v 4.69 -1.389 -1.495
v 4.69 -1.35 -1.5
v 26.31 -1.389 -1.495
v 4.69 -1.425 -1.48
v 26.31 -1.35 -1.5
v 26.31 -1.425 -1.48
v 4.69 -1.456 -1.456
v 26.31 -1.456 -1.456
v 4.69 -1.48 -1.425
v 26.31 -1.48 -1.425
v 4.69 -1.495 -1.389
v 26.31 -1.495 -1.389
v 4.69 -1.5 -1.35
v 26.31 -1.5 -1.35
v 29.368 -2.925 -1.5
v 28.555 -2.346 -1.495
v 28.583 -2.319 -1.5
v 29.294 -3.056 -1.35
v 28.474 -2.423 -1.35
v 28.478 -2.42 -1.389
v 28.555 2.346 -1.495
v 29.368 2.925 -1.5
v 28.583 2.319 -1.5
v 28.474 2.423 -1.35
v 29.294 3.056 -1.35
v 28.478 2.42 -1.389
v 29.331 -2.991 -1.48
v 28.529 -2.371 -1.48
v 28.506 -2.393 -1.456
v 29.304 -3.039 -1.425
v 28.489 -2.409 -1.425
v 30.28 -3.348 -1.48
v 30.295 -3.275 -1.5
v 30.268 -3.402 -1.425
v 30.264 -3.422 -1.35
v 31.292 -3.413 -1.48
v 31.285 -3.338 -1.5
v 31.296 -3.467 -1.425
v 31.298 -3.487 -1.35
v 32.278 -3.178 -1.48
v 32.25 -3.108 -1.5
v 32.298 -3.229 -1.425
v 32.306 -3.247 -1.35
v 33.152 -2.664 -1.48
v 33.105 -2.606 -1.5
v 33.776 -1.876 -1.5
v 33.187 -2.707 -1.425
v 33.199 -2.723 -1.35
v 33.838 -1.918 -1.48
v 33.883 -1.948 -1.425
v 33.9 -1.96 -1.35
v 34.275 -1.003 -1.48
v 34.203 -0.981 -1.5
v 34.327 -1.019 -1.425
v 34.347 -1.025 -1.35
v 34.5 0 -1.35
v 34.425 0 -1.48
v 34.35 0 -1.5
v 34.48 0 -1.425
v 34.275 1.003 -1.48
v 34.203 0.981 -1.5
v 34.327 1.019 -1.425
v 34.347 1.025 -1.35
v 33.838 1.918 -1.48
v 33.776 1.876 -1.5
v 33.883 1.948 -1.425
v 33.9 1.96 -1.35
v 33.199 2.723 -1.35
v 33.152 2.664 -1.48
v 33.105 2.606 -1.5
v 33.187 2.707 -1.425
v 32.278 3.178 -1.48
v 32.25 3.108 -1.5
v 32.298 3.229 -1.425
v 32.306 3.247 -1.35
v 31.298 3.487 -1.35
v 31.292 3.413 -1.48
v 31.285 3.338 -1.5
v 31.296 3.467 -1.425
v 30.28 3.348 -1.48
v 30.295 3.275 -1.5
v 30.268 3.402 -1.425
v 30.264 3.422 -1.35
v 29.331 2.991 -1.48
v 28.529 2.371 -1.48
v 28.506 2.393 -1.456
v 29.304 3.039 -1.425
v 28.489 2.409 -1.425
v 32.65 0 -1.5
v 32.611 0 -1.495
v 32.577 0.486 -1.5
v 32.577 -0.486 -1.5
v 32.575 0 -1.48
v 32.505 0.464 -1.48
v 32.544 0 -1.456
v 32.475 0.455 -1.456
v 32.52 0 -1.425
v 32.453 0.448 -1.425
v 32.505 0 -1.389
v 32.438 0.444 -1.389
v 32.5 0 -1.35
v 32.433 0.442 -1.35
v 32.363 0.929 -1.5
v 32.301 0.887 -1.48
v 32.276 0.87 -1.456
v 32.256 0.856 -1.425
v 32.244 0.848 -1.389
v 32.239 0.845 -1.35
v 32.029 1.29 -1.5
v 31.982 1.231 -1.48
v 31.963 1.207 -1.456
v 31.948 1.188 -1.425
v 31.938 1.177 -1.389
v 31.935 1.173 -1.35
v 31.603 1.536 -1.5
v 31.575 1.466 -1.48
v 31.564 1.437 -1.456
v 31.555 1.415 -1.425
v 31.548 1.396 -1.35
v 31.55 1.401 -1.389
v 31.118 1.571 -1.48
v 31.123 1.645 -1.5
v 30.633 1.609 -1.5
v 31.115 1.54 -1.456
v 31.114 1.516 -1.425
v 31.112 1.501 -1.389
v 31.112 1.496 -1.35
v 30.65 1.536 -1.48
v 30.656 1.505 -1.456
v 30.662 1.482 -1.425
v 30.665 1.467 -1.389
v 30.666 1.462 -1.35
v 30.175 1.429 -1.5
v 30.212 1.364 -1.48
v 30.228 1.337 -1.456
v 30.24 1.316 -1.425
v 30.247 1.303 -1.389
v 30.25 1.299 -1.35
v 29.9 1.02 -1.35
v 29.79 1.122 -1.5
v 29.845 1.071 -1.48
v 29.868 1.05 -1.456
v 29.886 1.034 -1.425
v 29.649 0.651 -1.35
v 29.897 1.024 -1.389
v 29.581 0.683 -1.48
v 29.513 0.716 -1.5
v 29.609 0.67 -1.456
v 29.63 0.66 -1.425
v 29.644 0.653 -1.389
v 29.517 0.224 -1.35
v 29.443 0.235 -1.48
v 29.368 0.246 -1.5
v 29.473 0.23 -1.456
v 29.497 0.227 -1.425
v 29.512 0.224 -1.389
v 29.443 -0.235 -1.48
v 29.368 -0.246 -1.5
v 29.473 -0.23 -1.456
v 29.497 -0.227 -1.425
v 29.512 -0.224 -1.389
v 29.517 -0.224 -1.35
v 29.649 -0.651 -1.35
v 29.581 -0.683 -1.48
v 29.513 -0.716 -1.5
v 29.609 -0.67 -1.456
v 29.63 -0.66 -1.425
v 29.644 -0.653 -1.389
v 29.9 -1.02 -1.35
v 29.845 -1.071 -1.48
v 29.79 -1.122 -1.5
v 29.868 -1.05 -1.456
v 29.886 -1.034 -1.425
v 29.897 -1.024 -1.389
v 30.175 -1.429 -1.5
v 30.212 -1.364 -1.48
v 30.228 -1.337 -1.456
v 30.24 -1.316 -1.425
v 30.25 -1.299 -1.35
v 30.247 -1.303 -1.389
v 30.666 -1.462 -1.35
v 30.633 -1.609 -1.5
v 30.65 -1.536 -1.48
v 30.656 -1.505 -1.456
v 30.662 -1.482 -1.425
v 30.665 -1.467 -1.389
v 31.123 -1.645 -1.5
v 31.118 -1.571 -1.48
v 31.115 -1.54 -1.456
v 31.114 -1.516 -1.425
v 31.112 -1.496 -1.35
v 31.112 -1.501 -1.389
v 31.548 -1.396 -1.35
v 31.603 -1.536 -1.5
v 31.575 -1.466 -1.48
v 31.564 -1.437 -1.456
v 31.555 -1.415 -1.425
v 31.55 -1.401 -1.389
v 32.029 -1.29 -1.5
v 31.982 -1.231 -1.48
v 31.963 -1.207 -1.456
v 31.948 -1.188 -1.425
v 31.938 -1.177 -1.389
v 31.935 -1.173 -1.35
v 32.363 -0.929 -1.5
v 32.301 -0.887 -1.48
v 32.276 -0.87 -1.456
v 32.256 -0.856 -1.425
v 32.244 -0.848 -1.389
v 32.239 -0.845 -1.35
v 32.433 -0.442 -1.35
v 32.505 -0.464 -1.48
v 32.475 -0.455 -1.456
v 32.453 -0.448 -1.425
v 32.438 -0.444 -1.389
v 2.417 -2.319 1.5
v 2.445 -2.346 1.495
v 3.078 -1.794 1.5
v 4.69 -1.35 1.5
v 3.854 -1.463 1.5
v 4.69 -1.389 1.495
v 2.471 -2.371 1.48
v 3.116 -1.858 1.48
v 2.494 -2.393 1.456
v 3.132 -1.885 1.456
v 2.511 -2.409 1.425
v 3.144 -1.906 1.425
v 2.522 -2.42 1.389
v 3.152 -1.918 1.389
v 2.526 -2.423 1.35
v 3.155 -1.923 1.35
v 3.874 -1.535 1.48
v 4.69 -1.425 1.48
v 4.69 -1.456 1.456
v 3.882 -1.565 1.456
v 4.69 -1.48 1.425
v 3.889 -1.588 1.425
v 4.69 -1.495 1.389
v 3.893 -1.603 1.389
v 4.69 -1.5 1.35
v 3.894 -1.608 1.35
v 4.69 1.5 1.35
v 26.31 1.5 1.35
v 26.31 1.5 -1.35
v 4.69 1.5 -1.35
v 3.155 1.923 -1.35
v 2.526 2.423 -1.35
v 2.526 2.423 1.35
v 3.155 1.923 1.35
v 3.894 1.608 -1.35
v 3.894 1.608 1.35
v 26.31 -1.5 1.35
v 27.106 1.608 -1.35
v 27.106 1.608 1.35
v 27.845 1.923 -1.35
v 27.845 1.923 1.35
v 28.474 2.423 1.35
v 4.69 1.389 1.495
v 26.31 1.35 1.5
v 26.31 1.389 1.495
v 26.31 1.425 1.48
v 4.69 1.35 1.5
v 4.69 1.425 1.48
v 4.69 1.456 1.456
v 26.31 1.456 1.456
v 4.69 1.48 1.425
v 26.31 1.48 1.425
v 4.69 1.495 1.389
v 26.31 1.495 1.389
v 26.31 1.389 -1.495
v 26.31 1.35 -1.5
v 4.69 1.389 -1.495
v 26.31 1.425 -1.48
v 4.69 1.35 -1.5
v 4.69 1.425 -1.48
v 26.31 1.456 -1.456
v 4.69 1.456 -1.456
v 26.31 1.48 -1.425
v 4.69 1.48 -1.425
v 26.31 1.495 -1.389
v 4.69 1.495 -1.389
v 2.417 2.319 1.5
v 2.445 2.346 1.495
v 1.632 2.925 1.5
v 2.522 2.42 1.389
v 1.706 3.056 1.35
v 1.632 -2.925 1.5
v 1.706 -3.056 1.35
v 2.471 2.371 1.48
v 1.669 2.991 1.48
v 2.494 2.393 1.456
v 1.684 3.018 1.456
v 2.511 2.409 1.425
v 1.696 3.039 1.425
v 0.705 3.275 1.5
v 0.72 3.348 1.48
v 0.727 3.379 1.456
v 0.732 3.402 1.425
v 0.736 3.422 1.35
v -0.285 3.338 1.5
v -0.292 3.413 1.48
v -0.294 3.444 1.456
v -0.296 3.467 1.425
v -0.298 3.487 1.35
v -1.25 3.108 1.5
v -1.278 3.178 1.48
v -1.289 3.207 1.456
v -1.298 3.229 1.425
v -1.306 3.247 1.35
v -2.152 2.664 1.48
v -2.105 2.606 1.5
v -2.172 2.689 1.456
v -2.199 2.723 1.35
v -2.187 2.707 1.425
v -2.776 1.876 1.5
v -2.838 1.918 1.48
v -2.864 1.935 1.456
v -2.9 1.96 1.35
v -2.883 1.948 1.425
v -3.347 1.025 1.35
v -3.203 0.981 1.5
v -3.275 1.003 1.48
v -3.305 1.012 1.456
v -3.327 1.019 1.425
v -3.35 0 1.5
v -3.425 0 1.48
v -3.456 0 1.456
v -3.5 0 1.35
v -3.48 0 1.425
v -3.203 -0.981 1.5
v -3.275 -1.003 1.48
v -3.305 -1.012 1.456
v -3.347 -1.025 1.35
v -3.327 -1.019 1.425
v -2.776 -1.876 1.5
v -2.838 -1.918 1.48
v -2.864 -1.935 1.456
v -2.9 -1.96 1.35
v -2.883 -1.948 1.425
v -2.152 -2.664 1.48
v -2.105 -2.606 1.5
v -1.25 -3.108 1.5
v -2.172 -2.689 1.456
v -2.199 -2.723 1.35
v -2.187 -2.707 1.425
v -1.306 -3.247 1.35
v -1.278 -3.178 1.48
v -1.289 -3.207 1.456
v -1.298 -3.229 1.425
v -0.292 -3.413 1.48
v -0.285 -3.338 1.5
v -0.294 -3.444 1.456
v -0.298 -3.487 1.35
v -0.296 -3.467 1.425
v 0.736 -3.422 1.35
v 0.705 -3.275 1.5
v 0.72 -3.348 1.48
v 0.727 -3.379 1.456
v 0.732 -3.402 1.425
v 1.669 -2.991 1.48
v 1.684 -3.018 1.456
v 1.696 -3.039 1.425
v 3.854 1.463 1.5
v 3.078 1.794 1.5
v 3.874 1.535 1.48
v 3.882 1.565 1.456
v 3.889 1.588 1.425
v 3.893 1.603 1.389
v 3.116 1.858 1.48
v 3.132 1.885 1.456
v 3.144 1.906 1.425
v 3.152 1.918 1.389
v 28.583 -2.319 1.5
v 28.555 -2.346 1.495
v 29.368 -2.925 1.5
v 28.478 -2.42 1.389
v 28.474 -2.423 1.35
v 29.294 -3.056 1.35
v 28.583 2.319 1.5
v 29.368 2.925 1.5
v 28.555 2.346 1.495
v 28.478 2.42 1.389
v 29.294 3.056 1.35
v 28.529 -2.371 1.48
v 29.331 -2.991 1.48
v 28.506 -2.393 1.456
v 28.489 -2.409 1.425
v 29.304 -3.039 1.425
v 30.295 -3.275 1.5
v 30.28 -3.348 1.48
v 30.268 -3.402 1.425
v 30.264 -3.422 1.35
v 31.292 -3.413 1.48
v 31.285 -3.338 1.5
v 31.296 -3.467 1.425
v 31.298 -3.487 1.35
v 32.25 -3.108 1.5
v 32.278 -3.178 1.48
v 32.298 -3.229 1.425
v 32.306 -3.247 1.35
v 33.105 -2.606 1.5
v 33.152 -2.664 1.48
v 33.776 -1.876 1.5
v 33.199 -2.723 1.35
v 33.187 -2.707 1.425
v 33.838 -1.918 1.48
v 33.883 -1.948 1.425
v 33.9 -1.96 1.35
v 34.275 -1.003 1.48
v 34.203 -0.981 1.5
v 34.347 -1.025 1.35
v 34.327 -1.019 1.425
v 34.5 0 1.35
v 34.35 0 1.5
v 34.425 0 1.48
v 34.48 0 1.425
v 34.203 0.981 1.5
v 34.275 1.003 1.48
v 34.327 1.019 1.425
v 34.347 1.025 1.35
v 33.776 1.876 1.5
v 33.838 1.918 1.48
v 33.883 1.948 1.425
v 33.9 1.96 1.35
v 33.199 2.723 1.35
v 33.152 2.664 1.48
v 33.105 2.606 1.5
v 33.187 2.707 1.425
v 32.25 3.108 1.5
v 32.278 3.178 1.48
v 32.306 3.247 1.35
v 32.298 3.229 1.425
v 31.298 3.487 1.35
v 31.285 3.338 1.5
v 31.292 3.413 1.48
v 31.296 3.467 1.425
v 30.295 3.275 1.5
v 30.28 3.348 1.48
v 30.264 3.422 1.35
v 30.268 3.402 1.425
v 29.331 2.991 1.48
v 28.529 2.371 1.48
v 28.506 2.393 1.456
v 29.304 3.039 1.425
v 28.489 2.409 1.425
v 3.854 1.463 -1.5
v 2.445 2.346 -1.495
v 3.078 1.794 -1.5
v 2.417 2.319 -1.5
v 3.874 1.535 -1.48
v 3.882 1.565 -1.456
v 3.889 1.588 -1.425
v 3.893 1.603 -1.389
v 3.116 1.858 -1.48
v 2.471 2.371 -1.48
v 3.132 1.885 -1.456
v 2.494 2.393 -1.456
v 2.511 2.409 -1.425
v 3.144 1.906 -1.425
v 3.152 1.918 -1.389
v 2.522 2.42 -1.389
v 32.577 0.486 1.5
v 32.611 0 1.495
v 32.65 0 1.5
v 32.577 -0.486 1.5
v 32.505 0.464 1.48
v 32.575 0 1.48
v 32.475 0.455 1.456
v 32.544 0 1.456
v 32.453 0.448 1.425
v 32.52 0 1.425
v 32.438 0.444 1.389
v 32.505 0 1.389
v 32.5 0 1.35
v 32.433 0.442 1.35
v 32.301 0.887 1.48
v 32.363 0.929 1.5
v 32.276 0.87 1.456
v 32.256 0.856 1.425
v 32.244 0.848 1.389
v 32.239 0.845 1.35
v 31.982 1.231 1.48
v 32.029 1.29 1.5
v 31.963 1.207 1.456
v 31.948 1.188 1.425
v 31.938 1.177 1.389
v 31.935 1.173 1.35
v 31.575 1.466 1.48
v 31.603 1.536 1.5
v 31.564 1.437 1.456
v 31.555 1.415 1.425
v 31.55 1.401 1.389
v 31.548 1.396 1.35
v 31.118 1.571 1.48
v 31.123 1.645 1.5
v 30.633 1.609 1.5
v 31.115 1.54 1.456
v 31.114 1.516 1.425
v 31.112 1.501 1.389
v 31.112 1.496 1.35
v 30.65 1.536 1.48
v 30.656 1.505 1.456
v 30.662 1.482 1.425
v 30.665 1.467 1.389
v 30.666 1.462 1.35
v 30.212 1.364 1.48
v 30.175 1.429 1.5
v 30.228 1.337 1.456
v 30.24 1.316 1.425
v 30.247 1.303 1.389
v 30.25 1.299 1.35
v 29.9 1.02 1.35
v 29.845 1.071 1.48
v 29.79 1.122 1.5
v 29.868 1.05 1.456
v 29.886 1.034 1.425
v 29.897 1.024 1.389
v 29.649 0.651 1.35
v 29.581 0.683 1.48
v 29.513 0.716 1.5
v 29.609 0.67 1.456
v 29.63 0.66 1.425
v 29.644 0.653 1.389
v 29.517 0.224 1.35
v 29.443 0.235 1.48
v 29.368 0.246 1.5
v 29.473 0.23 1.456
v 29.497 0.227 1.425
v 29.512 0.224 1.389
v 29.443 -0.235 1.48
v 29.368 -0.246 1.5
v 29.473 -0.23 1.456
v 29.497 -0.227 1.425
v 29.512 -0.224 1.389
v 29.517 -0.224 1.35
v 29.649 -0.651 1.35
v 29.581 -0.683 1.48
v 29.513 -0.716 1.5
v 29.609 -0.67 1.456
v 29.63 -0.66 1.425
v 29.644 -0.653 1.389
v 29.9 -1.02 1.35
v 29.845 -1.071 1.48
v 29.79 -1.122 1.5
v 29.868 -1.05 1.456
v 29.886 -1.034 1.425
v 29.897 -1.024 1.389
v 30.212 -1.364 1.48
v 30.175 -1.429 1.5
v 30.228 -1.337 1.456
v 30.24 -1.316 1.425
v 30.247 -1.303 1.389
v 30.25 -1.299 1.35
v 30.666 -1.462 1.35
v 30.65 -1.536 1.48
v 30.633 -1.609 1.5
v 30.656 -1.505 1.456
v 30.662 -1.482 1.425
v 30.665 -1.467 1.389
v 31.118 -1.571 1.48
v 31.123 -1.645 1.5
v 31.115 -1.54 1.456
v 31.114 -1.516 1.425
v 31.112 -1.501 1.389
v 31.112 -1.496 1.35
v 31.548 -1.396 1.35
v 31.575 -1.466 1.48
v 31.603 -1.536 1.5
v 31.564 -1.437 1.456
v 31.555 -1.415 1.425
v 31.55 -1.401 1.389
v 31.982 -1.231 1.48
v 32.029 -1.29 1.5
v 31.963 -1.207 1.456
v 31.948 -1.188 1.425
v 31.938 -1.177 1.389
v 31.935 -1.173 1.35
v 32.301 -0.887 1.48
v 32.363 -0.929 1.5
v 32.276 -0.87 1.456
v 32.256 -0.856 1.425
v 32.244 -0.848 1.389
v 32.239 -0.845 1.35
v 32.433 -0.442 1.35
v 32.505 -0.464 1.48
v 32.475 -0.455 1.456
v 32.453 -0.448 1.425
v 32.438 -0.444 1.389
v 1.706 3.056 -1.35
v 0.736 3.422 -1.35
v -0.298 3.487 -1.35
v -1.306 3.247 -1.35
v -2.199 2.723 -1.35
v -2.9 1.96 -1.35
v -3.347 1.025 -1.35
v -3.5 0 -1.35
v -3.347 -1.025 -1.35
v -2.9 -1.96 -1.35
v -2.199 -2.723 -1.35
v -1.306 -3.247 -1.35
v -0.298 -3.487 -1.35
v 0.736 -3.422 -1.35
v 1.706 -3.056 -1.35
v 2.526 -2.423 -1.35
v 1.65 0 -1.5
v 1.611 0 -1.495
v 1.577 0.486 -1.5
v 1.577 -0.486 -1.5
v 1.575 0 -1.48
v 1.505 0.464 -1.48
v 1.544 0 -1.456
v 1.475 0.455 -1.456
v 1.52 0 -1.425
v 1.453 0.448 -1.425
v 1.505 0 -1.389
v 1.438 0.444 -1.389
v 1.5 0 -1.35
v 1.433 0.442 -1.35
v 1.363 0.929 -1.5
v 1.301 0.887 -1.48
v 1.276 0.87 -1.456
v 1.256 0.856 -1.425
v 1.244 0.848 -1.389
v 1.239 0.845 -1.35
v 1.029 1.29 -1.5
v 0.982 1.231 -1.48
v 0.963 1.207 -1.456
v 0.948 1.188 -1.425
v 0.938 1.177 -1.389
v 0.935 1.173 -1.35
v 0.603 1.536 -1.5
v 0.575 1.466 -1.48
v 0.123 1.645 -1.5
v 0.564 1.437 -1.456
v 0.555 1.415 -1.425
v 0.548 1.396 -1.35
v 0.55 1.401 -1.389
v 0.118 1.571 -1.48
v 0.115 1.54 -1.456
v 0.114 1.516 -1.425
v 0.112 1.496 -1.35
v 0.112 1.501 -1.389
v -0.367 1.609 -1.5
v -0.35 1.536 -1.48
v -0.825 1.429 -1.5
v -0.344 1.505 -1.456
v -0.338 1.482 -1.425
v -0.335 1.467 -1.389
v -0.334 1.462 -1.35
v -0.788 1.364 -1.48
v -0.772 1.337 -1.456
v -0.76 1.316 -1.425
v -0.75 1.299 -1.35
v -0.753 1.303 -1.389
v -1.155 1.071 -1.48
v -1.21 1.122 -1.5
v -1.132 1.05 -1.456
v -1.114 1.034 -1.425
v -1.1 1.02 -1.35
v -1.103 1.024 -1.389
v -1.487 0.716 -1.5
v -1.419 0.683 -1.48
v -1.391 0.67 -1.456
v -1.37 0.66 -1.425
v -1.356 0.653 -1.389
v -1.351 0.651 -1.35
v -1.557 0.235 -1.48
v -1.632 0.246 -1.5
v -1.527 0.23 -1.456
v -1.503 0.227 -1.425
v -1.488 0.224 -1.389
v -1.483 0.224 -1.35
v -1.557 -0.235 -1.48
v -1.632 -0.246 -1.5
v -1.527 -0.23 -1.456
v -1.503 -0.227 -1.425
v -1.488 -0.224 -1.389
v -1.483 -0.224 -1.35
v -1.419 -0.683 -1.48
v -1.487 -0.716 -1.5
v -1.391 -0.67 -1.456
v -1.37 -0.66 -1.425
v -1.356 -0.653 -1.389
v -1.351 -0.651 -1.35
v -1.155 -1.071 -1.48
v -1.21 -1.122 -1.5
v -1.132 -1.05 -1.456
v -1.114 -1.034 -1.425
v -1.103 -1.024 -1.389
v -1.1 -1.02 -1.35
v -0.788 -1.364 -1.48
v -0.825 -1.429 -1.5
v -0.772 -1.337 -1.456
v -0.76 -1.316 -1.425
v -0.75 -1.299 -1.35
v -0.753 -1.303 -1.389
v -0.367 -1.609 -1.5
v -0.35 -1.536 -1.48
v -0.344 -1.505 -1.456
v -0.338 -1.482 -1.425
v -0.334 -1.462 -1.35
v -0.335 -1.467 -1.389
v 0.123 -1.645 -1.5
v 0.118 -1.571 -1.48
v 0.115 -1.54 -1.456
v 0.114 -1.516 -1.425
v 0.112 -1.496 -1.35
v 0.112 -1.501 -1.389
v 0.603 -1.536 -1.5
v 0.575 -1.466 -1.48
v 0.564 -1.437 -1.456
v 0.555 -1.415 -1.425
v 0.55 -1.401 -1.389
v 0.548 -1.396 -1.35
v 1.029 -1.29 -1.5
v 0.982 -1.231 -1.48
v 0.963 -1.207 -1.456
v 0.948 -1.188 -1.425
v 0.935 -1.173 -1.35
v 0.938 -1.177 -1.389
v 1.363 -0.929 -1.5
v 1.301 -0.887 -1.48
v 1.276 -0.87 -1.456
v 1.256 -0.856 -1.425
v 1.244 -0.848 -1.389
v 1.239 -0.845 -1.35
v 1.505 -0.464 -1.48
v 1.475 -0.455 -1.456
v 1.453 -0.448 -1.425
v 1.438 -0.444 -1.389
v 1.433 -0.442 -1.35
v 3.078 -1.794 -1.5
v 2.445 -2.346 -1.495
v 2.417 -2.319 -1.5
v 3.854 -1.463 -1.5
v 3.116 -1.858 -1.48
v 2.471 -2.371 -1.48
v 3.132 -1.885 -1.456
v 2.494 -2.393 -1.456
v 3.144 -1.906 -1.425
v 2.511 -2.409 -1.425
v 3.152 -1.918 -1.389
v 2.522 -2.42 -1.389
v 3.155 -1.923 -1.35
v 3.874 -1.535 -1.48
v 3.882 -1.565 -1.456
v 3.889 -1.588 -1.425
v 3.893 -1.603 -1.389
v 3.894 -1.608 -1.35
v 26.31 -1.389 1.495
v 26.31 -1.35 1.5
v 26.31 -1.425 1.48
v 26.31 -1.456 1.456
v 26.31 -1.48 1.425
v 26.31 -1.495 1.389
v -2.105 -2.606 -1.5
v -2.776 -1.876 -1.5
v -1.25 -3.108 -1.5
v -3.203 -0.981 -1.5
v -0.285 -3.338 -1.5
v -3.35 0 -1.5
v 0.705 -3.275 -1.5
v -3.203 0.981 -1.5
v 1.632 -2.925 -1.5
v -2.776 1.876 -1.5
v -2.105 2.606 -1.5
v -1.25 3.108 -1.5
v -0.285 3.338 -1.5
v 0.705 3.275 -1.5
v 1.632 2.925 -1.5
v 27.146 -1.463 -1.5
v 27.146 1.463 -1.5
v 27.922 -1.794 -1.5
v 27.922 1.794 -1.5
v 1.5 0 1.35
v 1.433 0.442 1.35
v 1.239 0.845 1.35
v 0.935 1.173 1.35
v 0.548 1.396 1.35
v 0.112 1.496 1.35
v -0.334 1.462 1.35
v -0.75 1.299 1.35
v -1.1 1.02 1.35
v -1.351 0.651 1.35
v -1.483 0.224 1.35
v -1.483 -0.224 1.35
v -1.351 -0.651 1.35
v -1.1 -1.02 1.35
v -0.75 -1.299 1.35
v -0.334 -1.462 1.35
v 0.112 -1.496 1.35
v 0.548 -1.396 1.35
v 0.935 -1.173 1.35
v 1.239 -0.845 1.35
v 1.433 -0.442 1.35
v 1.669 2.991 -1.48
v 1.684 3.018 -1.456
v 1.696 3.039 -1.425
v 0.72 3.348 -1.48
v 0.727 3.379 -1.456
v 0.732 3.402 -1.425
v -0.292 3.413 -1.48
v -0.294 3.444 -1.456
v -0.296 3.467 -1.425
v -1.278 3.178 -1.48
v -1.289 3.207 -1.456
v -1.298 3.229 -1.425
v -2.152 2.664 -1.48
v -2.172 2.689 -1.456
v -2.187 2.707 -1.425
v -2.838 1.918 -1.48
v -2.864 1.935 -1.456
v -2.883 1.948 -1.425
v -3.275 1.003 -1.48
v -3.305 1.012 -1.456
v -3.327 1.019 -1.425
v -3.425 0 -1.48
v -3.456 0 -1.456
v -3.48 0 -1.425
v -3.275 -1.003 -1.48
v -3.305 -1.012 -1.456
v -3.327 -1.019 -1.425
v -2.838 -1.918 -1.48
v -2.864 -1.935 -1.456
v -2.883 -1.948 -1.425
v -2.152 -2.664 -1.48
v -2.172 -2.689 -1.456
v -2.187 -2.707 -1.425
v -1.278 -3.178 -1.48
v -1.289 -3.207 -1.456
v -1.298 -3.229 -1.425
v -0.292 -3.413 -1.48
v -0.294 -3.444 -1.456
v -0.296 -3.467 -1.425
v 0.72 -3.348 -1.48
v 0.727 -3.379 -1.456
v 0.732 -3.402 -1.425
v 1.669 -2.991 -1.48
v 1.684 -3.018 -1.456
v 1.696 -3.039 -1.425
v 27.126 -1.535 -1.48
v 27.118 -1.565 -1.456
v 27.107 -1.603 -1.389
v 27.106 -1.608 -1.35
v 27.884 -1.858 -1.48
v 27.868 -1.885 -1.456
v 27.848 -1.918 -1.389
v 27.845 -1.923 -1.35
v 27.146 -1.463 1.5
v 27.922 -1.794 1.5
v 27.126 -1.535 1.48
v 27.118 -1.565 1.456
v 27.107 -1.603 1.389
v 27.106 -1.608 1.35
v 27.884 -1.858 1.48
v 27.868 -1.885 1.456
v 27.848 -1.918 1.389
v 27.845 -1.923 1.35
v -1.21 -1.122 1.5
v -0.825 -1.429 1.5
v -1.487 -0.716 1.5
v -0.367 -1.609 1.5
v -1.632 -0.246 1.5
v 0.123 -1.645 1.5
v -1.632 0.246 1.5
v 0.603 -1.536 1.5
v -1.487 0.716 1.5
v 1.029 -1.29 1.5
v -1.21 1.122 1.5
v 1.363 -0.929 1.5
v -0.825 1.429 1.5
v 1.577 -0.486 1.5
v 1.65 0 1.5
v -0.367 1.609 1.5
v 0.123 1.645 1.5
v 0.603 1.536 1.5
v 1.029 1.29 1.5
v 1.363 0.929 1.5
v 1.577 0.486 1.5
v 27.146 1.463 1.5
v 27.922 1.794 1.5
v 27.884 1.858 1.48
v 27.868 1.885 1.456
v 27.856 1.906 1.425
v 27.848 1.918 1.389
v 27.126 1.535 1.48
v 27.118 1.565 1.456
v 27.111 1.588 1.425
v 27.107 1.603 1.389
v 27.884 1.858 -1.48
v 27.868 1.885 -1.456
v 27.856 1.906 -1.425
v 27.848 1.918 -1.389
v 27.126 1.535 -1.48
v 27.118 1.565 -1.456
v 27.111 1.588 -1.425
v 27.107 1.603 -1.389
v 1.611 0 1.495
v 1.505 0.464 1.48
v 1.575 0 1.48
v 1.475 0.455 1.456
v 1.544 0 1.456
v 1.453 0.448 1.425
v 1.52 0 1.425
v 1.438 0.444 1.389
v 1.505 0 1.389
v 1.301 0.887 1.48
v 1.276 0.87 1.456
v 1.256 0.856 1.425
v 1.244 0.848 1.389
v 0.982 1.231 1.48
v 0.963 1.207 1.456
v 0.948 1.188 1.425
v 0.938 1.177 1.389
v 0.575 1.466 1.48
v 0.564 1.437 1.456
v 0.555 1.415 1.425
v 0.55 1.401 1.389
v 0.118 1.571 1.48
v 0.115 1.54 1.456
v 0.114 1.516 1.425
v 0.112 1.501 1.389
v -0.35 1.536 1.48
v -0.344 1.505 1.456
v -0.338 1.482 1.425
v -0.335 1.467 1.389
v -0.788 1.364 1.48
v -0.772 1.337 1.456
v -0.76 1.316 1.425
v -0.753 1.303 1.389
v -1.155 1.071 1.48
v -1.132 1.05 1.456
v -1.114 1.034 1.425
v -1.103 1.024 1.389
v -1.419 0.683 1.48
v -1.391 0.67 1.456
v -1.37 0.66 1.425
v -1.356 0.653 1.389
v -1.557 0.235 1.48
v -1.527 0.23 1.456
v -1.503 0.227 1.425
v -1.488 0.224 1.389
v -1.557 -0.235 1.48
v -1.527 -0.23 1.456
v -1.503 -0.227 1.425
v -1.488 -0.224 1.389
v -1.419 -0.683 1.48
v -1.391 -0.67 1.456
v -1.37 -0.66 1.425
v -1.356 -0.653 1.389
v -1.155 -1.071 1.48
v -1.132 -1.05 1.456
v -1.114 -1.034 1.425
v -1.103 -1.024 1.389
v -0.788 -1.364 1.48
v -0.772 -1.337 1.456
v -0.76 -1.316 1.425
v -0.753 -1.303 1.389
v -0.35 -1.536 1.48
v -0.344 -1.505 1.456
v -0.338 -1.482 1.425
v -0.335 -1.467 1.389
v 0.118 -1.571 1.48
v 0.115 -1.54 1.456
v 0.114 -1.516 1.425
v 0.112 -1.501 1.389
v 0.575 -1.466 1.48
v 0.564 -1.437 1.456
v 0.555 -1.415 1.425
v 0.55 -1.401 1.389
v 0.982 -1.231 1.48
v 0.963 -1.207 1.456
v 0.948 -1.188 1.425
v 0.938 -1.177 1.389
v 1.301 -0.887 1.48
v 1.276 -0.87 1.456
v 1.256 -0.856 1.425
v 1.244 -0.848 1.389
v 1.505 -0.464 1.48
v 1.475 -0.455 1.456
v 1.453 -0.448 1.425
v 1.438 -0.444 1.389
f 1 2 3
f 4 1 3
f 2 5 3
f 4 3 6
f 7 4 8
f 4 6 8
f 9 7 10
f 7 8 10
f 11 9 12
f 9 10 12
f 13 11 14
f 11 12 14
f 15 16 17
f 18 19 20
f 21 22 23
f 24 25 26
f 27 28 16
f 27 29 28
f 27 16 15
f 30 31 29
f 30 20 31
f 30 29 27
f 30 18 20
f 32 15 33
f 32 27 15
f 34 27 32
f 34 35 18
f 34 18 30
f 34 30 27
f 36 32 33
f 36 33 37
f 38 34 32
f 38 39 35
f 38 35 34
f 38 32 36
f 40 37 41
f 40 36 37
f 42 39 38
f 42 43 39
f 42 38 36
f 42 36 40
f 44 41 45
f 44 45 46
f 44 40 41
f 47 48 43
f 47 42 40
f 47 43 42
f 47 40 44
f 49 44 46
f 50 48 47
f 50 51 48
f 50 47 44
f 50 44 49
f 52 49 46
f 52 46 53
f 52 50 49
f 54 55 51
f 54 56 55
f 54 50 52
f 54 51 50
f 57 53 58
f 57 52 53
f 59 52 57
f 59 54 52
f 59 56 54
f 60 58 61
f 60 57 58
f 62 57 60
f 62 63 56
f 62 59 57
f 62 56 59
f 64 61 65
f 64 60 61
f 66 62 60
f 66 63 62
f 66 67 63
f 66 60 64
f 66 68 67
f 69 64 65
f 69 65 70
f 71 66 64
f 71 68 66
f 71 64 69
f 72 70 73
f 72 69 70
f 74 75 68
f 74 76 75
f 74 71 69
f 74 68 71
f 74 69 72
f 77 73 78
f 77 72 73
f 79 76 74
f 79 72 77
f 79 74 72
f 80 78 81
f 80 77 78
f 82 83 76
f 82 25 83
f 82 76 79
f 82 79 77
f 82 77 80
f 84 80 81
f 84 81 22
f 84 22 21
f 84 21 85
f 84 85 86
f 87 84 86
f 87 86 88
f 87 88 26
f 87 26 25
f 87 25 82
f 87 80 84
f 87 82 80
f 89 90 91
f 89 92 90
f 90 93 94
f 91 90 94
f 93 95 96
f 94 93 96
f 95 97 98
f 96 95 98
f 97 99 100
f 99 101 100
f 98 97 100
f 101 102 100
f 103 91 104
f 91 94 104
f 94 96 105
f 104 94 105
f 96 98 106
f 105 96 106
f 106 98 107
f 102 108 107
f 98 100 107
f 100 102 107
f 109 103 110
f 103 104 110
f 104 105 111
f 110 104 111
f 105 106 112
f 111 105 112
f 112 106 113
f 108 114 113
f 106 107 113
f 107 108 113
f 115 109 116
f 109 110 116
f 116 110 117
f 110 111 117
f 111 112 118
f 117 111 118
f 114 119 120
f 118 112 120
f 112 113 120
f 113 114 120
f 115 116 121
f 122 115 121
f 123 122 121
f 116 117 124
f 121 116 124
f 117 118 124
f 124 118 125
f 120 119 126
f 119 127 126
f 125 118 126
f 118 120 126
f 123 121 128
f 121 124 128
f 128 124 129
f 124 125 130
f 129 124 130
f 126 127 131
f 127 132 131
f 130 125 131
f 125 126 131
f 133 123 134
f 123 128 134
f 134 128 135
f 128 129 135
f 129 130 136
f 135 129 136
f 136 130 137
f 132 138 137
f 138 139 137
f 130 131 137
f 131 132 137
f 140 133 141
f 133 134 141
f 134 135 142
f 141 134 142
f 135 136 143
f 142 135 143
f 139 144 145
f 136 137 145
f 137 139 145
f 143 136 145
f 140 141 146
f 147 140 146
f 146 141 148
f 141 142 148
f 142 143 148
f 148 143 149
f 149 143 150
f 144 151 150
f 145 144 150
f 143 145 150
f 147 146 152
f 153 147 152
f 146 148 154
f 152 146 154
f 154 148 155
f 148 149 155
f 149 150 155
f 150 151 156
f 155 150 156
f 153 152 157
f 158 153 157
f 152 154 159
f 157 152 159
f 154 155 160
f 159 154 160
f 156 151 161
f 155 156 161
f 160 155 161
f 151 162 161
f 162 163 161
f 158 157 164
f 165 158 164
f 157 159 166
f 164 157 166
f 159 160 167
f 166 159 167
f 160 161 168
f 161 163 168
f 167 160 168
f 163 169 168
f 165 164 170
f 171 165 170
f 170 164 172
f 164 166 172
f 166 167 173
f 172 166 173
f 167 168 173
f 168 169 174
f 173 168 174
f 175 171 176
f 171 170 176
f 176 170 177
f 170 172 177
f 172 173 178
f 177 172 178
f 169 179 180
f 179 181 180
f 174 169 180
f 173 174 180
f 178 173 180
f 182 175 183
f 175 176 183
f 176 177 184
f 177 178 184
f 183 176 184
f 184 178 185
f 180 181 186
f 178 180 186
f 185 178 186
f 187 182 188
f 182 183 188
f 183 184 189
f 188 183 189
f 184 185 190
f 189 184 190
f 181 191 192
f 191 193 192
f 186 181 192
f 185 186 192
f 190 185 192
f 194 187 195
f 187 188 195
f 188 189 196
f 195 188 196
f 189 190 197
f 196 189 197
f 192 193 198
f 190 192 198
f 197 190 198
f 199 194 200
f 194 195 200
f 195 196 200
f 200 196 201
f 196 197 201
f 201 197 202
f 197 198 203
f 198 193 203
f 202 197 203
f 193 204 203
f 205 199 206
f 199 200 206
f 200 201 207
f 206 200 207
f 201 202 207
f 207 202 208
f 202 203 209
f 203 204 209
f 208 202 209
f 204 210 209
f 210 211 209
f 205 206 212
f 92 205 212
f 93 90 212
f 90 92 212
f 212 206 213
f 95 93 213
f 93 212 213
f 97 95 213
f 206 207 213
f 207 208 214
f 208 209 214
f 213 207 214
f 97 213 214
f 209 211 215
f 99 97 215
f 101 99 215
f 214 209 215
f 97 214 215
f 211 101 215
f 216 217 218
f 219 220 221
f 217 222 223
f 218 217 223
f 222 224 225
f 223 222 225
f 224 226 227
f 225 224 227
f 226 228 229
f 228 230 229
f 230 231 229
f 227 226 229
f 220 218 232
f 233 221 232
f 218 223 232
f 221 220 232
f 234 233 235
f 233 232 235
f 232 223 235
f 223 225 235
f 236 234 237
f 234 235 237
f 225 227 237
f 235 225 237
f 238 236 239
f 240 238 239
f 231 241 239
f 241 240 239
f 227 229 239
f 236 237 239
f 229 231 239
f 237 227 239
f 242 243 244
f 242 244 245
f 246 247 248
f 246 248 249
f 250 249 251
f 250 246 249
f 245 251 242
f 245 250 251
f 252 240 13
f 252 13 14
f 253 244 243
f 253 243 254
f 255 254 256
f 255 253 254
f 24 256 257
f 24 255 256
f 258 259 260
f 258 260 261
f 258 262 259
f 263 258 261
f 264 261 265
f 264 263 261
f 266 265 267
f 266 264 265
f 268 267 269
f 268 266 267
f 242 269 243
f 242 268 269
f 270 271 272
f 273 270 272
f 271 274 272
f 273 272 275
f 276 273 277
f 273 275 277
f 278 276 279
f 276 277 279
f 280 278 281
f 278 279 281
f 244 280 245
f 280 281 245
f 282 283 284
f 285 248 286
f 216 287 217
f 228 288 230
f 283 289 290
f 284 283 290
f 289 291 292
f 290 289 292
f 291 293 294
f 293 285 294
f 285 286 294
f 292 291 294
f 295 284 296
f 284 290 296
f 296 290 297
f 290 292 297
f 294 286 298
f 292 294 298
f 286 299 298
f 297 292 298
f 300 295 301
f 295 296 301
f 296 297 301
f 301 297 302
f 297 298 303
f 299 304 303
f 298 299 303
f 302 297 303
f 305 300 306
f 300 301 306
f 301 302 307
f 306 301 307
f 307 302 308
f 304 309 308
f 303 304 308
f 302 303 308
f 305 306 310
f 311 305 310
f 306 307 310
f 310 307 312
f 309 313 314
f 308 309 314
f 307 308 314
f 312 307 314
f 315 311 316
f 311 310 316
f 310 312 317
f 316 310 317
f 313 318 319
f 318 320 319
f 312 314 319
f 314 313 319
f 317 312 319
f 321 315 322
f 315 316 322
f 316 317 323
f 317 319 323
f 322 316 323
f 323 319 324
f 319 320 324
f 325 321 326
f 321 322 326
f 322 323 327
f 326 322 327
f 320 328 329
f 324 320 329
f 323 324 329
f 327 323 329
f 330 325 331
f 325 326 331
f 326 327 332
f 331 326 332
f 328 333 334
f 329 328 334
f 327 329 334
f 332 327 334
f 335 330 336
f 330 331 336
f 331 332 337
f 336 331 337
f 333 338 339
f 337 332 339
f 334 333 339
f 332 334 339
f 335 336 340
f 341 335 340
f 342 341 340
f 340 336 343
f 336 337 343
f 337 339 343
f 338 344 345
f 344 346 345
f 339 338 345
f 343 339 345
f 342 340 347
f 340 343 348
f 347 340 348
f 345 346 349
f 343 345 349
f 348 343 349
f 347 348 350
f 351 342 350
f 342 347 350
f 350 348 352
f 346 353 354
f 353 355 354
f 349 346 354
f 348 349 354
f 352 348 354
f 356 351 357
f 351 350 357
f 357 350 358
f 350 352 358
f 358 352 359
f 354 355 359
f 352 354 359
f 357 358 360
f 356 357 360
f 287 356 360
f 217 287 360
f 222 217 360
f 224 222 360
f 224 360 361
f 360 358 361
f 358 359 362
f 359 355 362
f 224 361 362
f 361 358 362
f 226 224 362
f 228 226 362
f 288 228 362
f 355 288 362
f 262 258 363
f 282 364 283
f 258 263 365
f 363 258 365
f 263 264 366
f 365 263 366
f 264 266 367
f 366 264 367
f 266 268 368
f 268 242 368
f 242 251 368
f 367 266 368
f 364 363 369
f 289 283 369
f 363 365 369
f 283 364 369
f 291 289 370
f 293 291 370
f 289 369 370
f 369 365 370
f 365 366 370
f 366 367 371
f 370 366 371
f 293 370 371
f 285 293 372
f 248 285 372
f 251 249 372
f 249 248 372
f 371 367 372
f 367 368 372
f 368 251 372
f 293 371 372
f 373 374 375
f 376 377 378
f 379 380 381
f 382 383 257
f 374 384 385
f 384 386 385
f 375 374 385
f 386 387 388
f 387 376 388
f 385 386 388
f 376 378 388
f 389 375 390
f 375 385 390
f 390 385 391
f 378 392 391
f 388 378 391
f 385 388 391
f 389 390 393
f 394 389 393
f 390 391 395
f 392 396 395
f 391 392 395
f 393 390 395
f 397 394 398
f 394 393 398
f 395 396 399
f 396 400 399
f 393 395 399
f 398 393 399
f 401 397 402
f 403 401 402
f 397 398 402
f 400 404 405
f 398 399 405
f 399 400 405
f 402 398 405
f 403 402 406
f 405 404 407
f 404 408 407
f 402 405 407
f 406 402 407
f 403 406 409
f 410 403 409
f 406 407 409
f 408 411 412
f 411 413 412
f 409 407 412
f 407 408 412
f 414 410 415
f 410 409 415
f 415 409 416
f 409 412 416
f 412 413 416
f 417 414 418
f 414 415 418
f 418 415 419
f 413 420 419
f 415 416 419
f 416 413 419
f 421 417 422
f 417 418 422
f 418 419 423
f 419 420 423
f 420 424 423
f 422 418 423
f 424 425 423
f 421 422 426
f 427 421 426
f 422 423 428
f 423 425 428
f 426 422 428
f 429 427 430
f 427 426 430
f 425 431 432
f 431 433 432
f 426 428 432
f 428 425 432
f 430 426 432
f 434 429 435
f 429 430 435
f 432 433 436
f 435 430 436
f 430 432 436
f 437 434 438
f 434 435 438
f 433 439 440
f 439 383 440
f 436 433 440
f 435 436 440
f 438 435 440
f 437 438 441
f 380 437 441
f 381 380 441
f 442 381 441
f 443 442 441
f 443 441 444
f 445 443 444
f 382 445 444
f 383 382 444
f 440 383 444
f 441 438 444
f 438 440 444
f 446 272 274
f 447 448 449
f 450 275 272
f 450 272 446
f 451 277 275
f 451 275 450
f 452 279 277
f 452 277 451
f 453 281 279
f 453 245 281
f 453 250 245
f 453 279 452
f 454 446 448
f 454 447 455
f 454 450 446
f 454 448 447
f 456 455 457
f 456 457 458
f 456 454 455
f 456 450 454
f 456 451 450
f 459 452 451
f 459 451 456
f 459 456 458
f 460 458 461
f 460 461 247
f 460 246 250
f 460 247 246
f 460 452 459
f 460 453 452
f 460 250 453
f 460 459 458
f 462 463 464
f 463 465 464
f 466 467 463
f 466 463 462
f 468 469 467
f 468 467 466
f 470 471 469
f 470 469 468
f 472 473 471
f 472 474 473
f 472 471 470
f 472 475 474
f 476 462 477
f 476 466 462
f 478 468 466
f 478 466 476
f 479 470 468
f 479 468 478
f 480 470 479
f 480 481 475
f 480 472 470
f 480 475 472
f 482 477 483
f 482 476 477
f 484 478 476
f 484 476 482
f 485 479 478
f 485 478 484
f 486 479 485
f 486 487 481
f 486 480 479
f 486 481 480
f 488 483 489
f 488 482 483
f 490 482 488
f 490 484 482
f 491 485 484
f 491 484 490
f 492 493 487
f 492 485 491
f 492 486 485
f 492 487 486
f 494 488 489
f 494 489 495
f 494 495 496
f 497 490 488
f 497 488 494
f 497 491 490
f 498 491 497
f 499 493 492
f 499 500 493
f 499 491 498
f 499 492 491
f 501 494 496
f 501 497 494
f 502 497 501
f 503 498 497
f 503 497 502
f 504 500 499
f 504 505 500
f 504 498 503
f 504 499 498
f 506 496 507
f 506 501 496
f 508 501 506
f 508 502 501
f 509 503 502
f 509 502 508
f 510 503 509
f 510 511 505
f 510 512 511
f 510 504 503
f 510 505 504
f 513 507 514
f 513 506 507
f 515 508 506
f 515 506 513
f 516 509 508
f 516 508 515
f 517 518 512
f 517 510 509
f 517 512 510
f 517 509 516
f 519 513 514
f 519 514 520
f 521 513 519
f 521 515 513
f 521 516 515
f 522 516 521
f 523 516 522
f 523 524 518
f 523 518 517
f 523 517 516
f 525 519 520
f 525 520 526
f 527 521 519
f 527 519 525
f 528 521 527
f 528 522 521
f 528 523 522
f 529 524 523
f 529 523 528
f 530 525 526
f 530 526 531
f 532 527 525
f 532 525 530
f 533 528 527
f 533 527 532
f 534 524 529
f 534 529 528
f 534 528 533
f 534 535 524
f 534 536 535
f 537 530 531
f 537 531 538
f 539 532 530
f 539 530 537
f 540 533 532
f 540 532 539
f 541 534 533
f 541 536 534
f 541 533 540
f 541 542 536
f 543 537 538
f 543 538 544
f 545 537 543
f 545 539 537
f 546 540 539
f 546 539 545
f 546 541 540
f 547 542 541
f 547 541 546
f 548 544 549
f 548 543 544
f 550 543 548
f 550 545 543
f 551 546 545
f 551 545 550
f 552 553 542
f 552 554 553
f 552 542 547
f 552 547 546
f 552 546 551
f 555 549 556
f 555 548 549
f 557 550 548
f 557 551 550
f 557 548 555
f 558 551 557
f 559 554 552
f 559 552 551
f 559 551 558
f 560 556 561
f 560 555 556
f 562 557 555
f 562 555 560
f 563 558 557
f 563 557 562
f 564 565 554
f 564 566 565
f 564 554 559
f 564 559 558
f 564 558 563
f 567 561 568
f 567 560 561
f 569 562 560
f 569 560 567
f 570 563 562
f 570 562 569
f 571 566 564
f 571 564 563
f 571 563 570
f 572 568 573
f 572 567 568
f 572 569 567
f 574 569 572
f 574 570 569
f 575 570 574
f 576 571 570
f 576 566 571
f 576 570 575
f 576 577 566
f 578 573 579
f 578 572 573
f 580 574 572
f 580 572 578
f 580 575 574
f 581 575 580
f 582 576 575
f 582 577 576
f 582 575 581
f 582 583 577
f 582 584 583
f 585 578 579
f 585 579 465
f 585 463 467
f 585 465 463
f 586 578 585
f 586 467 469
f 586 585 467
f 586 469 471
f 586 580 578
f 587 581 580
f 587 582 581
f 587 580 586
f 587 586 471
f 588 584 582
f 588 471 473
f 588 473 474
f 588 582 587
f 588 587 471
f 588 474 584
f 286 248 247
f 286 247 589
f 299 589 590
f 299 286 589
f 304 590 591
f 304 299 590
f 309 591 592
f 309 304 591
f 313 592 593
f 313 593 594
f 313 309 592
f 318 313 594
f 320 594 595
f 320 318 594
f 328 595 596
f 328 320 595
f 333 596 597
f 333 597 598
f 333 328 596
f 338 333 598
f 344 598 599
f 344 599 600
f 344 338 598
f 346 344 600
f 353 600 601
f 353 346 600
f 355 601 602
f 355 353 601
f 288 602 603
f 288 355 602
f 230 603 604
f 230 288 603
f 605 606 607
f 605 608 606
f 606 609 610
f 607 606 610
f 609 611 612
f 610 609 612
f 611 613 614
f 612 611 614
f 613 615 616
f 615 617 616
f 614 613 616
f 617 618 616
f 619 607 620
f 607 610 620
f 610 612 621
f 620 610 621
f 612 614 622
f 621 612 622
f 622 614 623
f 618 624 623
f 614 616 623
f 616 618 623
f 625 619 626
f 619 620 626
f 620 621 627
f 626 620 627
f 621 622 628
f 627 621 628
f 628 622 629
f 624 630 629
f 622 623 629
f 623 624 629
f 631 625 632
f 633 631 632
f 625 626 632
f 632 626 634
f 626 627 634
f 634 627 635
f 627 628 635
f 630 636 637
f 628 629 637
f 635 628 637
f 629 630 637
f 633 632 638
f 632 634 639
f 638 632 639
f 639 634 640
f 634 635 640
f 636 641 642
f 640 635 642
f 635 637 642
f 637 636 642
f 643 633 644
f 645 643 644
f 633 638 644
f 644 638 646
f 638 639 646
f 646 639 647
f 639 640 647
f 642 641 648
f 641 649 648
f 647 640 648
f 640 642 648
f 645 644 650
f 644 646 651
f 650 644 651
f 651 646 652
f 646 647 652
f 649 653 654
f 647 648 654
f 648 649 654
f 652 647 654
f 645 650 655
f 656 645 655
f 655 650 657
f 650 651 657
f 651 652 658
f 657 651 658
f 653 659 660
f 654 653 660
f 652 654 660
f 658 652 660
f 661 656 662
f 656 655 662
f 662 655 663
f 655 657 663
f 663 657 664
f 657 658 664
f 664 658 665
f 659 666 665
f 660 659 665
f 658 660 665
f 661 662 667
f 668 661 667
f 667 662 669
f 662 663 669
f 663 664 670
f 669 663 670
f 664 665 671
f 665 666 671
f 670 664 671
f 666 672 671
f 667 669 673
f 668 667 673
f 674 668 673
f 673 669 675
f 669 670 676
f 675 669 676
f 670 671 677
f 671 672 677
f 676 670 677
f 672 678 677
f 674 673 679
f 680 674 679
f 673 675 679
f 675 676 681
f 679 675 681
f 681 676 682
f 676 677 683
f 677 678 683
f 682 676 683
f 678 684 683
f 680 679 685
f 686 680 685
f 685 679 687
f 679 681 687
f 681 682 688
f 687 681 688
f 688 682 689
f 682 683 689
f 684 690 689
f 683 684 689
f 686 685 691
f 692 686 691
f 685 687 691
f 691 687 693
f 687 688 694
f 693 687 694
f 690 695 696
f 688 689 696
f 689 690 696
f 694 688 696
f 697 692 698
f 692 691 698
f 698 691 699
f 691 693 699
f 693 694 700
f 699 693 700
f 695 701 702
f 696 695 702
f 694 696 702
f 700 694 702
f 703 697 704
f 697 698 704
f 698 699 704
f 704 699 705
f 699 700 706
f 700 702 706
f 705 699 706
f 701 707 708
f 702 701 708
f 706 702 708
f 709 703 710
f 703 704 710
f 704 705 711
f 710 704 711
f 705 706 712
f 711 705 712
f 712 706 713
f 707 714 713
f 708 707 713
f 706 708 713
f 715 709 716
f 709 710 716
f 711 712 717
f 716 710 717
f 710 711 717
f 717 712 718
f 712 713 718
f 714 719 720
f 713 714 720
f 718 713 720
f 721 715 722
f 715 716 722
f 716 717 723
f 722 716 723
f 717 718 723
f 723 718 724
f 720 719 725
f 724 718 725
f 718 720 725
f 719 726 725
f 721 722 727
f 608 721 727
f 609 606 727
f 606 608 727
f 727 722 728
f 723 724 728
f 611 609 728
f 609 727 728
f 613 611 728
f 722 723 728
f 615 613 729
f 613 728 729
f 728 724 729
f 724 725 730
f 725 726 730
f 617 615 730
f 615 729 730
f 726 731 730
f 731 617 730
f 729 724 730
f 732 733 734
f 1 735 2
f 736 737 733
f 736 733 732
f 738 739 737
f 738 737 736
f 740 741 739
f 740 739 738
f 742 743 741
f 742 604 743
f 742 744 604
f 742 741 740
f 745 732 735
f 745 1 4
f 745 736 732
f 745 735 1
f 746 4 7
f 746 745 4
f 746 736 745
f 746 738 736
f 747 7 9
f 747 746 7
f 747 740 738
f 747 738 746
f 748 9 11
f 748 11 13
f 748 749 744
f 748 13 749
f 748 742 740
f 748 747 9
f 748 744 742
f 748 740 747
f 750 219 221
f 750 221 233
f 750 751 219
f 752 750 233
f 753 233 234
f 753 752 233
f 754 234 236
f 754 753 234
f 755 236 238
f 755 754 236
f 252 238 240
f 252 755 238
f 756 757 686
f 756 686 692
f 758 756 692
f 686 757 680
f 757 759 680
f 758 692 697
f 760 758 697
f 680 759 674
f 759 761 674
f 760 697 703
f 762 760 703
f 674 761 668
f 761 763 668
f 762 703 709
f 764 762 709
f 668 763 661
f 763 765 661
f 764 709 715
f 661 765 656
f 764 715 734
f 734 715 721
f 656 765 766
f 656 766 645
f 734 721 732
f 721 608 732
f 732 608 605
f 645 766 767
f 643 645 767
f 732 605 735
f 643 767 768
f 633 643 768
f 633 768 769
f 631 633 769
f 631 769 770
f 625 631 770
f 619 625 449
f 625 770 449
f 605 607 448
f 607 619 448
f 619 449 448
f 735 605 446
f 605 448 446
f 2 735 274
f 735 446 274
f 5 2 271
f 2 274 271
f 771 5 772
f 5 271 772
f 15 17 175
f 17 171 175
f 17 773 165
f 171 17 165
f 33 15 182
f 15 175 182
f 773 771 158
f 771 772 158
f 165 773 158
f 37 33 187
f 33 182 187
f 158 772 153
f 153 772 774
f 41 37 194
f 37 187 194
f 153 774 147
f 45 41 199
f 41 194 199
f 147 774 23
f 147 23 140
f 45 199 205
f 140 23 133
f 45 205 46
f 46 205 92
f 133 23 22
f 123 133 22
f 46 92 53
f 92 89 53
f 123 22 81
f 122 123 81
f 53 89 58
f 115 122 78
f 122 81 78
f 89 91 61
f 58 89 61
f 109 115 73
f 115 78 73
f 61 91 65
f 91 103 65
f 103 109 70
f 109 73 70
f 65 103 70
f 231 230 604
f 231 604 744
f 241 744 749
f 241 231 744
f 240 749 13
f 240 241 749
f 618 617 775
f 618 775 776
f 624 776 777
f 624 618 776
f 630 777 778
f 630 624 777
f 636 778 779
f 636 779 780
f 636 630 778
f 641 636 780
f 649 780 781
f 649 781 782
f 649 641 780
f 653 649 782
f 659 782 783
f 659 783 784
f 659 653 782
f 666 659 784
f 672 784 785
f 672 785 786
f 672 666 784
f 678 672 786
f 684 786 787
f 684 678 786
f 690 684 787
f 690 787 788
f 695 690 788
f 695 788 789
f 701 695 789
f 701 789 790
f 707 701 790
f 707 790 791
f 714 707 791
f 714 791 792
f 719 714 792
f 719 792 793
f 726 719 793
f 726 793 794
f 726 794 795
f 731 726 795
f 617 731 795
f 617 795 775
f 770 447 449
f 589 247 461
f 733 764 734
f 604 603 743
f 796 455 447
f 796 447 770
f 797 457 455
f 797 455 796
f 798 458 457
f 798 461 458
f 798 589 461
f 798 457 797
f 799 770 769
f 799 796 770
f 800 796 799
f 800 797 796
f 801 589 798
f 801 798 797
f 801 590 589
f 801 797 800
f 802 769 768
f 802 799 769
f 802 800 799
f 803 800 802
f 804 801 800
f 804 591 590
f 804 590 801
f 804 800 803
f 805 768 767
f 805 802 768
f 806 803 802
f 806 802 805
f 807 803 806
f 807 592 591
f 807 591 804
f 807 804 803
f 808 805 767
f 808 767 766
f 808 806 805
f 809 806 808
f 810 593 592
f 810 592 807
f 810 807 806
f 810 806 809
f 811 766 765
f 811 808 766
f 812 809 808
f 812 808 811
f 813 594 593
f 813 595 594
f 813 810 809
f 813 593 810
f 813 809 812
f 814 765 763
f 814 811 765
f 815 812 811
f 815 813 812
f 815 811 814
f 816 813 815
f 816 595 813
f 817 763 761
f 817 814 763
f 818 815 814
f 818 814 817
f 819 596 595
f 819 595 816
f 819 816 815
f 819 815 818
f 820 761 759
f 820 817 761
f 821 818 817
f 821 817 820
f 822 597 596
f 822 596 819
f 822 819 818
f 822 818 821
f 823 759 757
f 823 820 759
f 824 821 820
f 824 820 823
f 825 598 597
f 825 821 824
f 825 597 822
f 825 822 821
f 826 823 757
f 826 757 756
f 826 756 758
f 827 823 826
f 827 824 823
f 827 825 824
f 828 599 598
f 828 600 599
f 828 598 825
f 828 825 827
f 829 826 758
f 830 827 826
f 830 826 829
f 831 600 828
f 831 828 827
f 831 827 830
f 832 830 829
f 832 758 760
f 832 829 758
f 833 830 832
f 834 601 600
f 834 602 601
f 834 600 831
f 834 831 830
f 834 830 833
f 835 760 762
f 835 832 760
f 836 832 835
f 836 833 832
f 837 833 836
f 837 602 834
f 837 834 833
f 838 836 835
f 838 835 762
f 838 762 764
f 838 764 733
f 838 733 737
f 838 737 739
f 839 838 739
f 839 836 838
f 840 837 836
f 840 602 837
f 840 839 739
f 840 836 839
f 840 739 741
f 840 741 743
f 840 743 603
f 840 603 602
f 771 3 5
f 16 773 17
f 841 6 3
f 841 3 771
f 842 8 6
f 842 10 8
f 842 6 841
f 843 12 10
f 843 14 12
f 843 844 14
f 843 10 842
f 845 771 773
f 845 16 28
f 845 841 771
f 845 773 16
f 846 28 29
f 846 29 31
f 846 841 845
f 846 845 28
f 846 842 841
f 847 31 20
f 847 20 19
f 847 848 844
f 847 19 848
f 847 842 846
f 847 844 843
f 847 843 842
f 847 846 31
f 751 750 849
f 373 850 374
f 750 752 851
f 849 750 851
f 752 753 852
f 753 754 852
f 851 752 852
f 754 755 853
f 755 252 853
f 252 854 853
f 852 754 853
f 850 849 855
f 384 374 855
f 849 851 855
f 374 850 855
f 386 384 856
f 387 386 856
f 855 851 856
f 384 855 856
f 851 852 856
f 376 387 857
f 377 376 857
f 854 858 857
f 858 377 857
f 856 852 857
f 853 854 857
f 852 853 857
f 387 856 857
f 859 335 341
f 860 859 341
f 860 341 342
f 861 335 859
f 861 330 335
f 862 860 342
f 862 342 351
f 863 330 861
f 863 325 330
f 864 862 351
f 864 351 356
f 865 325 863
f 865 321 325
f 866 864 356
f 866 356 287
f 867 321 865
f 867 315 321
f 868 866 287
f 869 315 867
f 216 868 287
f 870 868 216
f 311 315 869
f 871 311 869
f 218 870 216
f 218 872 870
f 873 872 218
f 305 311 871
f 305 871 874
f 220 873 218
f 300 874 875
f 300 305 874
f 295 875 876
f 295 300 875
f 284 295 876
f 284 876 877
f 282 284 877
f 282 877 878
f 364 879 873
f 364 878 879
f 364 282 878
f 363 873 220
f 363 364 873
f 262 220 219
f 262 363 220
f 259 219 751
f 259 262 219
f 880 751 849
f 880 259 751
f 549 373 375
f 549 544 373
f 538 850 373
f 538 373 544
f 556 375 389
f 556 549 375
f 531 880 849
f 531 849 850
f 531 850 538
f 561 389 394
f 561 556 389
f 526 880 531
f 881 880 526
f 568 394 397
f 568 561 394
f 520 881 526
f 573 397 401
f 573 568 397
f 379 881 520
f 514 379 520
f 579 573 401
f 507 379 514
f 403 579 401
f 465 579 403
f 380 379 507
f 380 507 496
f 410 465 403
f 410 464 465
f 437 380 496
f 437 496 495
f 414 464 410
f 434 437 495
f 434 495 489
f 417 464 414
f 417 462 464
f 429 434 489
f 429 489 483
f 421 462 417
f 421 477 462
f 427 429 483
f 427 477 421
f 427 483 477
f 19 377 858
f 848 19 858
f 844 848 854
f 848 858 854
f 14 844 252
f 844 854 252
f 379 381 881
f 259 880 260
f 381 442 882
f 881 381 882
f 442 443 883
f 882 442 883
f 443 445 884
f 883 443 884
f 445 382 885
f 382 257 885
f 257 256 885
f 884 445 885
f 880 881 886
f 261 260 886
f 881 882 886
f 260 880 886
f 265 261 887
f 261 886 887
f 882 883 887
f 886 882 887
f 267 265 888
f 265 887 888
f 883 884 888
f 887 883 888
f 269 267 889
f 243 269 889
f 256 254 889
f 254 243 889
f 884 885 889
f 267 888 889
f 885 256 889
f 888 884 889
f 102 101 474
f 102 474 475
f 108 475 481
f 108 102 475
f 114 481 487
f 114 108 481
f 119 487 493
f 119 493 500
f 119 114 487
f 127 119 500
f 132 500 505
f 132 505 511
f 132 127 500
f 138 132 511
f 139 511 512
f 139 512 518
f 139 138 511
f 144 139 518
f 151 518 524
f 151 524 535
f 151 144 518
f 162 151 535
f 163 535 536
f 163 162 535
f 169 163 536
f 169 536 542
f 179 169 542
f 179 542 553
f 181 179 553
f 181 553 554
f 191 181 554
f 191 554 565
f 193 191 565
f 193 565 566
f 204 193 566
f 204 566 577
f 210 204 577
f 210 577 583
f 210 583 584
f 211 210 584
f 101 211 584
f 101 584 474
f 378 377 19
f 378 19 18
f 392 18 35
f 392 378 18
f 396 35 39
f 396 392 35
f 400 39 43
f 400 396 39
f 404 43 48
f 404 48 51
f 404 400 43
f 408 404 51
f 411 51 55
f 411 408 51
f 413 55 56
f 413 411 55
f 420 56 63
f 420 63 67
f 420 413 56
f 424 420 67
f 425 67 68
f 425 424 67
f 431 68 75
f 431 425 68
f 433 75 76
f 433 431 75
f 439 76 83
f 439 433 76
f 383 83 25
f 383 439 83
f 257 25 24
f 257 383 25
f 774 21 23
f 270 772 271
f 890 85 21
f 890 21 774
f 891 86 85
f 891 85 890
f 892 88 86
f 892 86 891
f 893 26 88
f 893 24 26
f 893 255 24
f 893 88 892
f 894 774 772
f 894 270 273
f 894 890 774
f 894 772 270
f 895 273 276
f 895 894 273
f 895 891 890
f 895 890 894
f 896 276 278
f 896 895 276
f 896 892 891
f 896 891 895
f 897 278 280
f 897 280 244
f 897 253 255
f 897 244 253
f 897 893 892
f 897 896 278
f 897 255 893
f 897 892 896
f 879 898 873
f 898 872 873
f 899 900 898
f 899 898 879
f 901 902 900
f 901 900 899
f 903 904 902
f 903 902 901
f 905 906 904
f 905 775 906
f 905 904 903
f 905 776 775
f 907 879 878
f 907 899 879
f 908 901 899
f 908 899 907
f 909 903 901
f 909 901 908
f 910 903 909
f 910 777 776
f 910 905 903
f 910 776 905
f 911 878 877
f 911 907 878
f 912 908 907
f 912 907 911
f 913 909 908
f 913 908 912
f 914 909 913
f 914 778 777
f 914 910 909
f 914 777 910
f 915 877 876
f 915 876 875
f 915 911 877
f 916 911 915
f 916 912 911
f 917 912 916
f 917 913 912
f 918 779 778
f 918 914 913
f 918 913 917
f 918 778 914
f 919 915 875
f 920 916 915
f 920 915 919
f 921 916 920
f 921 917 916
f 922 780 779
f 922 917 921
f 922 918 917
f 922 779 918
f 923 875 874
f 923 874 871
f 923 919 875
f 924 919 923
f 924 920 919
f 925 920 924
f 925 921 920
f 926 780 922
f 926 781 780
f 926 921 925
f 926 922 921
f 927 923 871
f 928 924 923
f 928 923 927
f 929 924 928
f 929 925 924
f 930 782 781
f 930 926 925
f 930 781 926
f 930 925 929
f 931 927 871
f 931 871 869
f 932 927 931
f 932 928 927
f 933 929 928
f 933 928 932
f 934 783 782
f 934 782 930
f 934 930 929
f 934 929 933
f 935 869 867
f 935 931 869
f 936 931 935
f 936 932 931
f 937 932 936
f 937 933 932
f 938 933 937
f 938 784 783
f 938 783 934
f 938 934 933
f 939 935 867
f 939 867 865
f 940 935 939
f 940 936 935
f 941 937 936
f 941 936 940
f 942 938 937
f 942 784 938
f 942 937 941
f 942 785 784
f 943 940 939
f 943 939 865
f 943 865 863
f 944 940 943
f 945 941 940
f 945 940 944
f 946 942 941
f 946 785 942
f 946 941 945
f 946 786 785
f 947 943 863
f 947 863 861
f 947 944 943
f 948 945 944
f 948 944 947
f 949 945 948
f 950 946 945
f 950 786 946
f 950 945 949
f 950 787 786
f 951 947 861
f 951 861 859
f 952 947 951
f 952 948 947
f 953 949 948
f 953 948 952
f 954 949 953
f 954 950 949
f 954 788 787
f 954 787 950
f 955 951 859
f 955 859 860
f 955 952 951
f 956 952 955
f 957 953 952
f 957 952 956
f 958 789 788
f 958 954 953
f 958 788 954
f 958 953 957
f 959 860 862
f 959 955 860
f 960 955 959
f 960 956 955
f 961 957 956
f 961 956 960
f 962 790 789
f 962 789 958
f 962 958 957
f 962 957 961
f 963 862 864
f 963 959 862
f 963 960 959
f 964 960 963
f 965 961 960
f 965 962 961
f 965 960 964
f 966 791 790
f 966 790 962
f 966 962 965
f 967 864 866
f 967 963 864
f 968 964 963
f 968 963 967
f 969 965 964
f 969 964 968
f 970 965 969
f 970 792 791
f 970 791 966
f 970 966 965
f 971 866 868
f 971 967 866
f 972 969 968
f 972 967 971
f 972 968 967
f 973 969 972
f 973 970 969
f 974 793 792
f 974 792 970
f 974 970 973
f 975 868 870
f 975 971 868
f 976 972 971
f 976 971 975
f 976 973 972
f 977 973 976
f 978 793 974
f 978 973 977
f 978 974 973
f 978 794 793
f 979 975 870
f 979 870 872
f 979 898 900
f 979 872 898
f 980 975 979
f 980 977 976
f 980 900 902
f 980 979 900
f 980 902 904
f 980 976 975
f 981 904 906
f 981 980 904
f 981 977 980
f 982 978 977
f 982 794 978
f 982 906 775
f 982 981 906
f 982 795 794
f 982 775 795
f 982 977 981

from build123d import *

# Parameters (mm, degrees)
SKETCH1_R           = 3.5
SKETCH1_R_2         = 1.5
BOSS_EXTRUDE1_DEPTH = 1.5
FILLET1_R           = 3
FILLET3_R           = 0.15


with BuildPart() as part:
    # Sketch1 → Boss-Extrude1 (new body, symmetric)
    with BuildSketch(Plane.XY):
        Circle(SKETCH1_R)
        Circle(SKETCH1_R_2, mode=Mode.SUBTRACT)
        with BuildLine():
            Line((3.16227766, -1.5), (27.83772234, -1.5))
            ThreePointArc((27.83772234, -1.5), (27.5, 0), (27.83772234, 1.5))
            Line((27.83772234, 1.5), (3.16227766, 1.5))
            ThreePointArc((3.16227766, 1.5), (3.414525722, 0.768774411), (3.5, 0))
            ThreePointArc((3.5, 0), (3.414525722, -0.768774411), (3.16227766, -1.5))
        make_face()
        with Locations((31, 0)):
            Circle(SKETCH1_R)
        with Locations((31, 0)):
            Circle(SKETCH1_R_2, mode=Mode.SUBTRACT)
    extrude(amount=BOSS_EXTRUDE1_DEPTH, both=True)

    # Fillet1
    fillet1_edges = [part.edges().sort_by_distance(p)[0] for p in [
        (27.83772234, 1.5, 0),
        (27.83772234, -1.5, 0),
        (3.16227766, -1.5, 0),
        (3.16227766, 1.5, 0),
    ]]
    fillet(fillet1_edges, radius=FILLET1_R)

    # Fillet3
    fillet3_edges = [part.edges().sort_by_distance(p)[0] for p in [
        (34.5, 0, -1.5),
        (34.5, 0, 1.5),
        (-1.5, 0, 1.5),
        (15.5, -1.5, -1.5),
        (15.5, -1.5, 1.5),
        (-3.5, 0, -1.5),
        (-3.5, 0, 1.5),
        (29.5, 0, 1.5),
        (15.5, 1.5, -1.5),
        (15.5, 1.5, 1.5),
        (27.486281051, -1.740401367, -1.5),
        (27.486281051, -1.740401367, 1.5),
        (3.513718949, -1.740401367, -1.5),
        (3.513718949, -1.740401367, 1.5),
        (27.486281051, 1.740401367, -1.5),
        (27.486281051, 1.740401367, 1.5),
        (3.513718949, 1.740401367, -1.5),
        (3.513718949, 1.740401367, 1.5),
        (29.5, 0, -1.5),
        (-1.5, 0, -1.5),
    ]]
    fillet(fillet3_edges, radius=FILLET3_R)


solid = part.part
